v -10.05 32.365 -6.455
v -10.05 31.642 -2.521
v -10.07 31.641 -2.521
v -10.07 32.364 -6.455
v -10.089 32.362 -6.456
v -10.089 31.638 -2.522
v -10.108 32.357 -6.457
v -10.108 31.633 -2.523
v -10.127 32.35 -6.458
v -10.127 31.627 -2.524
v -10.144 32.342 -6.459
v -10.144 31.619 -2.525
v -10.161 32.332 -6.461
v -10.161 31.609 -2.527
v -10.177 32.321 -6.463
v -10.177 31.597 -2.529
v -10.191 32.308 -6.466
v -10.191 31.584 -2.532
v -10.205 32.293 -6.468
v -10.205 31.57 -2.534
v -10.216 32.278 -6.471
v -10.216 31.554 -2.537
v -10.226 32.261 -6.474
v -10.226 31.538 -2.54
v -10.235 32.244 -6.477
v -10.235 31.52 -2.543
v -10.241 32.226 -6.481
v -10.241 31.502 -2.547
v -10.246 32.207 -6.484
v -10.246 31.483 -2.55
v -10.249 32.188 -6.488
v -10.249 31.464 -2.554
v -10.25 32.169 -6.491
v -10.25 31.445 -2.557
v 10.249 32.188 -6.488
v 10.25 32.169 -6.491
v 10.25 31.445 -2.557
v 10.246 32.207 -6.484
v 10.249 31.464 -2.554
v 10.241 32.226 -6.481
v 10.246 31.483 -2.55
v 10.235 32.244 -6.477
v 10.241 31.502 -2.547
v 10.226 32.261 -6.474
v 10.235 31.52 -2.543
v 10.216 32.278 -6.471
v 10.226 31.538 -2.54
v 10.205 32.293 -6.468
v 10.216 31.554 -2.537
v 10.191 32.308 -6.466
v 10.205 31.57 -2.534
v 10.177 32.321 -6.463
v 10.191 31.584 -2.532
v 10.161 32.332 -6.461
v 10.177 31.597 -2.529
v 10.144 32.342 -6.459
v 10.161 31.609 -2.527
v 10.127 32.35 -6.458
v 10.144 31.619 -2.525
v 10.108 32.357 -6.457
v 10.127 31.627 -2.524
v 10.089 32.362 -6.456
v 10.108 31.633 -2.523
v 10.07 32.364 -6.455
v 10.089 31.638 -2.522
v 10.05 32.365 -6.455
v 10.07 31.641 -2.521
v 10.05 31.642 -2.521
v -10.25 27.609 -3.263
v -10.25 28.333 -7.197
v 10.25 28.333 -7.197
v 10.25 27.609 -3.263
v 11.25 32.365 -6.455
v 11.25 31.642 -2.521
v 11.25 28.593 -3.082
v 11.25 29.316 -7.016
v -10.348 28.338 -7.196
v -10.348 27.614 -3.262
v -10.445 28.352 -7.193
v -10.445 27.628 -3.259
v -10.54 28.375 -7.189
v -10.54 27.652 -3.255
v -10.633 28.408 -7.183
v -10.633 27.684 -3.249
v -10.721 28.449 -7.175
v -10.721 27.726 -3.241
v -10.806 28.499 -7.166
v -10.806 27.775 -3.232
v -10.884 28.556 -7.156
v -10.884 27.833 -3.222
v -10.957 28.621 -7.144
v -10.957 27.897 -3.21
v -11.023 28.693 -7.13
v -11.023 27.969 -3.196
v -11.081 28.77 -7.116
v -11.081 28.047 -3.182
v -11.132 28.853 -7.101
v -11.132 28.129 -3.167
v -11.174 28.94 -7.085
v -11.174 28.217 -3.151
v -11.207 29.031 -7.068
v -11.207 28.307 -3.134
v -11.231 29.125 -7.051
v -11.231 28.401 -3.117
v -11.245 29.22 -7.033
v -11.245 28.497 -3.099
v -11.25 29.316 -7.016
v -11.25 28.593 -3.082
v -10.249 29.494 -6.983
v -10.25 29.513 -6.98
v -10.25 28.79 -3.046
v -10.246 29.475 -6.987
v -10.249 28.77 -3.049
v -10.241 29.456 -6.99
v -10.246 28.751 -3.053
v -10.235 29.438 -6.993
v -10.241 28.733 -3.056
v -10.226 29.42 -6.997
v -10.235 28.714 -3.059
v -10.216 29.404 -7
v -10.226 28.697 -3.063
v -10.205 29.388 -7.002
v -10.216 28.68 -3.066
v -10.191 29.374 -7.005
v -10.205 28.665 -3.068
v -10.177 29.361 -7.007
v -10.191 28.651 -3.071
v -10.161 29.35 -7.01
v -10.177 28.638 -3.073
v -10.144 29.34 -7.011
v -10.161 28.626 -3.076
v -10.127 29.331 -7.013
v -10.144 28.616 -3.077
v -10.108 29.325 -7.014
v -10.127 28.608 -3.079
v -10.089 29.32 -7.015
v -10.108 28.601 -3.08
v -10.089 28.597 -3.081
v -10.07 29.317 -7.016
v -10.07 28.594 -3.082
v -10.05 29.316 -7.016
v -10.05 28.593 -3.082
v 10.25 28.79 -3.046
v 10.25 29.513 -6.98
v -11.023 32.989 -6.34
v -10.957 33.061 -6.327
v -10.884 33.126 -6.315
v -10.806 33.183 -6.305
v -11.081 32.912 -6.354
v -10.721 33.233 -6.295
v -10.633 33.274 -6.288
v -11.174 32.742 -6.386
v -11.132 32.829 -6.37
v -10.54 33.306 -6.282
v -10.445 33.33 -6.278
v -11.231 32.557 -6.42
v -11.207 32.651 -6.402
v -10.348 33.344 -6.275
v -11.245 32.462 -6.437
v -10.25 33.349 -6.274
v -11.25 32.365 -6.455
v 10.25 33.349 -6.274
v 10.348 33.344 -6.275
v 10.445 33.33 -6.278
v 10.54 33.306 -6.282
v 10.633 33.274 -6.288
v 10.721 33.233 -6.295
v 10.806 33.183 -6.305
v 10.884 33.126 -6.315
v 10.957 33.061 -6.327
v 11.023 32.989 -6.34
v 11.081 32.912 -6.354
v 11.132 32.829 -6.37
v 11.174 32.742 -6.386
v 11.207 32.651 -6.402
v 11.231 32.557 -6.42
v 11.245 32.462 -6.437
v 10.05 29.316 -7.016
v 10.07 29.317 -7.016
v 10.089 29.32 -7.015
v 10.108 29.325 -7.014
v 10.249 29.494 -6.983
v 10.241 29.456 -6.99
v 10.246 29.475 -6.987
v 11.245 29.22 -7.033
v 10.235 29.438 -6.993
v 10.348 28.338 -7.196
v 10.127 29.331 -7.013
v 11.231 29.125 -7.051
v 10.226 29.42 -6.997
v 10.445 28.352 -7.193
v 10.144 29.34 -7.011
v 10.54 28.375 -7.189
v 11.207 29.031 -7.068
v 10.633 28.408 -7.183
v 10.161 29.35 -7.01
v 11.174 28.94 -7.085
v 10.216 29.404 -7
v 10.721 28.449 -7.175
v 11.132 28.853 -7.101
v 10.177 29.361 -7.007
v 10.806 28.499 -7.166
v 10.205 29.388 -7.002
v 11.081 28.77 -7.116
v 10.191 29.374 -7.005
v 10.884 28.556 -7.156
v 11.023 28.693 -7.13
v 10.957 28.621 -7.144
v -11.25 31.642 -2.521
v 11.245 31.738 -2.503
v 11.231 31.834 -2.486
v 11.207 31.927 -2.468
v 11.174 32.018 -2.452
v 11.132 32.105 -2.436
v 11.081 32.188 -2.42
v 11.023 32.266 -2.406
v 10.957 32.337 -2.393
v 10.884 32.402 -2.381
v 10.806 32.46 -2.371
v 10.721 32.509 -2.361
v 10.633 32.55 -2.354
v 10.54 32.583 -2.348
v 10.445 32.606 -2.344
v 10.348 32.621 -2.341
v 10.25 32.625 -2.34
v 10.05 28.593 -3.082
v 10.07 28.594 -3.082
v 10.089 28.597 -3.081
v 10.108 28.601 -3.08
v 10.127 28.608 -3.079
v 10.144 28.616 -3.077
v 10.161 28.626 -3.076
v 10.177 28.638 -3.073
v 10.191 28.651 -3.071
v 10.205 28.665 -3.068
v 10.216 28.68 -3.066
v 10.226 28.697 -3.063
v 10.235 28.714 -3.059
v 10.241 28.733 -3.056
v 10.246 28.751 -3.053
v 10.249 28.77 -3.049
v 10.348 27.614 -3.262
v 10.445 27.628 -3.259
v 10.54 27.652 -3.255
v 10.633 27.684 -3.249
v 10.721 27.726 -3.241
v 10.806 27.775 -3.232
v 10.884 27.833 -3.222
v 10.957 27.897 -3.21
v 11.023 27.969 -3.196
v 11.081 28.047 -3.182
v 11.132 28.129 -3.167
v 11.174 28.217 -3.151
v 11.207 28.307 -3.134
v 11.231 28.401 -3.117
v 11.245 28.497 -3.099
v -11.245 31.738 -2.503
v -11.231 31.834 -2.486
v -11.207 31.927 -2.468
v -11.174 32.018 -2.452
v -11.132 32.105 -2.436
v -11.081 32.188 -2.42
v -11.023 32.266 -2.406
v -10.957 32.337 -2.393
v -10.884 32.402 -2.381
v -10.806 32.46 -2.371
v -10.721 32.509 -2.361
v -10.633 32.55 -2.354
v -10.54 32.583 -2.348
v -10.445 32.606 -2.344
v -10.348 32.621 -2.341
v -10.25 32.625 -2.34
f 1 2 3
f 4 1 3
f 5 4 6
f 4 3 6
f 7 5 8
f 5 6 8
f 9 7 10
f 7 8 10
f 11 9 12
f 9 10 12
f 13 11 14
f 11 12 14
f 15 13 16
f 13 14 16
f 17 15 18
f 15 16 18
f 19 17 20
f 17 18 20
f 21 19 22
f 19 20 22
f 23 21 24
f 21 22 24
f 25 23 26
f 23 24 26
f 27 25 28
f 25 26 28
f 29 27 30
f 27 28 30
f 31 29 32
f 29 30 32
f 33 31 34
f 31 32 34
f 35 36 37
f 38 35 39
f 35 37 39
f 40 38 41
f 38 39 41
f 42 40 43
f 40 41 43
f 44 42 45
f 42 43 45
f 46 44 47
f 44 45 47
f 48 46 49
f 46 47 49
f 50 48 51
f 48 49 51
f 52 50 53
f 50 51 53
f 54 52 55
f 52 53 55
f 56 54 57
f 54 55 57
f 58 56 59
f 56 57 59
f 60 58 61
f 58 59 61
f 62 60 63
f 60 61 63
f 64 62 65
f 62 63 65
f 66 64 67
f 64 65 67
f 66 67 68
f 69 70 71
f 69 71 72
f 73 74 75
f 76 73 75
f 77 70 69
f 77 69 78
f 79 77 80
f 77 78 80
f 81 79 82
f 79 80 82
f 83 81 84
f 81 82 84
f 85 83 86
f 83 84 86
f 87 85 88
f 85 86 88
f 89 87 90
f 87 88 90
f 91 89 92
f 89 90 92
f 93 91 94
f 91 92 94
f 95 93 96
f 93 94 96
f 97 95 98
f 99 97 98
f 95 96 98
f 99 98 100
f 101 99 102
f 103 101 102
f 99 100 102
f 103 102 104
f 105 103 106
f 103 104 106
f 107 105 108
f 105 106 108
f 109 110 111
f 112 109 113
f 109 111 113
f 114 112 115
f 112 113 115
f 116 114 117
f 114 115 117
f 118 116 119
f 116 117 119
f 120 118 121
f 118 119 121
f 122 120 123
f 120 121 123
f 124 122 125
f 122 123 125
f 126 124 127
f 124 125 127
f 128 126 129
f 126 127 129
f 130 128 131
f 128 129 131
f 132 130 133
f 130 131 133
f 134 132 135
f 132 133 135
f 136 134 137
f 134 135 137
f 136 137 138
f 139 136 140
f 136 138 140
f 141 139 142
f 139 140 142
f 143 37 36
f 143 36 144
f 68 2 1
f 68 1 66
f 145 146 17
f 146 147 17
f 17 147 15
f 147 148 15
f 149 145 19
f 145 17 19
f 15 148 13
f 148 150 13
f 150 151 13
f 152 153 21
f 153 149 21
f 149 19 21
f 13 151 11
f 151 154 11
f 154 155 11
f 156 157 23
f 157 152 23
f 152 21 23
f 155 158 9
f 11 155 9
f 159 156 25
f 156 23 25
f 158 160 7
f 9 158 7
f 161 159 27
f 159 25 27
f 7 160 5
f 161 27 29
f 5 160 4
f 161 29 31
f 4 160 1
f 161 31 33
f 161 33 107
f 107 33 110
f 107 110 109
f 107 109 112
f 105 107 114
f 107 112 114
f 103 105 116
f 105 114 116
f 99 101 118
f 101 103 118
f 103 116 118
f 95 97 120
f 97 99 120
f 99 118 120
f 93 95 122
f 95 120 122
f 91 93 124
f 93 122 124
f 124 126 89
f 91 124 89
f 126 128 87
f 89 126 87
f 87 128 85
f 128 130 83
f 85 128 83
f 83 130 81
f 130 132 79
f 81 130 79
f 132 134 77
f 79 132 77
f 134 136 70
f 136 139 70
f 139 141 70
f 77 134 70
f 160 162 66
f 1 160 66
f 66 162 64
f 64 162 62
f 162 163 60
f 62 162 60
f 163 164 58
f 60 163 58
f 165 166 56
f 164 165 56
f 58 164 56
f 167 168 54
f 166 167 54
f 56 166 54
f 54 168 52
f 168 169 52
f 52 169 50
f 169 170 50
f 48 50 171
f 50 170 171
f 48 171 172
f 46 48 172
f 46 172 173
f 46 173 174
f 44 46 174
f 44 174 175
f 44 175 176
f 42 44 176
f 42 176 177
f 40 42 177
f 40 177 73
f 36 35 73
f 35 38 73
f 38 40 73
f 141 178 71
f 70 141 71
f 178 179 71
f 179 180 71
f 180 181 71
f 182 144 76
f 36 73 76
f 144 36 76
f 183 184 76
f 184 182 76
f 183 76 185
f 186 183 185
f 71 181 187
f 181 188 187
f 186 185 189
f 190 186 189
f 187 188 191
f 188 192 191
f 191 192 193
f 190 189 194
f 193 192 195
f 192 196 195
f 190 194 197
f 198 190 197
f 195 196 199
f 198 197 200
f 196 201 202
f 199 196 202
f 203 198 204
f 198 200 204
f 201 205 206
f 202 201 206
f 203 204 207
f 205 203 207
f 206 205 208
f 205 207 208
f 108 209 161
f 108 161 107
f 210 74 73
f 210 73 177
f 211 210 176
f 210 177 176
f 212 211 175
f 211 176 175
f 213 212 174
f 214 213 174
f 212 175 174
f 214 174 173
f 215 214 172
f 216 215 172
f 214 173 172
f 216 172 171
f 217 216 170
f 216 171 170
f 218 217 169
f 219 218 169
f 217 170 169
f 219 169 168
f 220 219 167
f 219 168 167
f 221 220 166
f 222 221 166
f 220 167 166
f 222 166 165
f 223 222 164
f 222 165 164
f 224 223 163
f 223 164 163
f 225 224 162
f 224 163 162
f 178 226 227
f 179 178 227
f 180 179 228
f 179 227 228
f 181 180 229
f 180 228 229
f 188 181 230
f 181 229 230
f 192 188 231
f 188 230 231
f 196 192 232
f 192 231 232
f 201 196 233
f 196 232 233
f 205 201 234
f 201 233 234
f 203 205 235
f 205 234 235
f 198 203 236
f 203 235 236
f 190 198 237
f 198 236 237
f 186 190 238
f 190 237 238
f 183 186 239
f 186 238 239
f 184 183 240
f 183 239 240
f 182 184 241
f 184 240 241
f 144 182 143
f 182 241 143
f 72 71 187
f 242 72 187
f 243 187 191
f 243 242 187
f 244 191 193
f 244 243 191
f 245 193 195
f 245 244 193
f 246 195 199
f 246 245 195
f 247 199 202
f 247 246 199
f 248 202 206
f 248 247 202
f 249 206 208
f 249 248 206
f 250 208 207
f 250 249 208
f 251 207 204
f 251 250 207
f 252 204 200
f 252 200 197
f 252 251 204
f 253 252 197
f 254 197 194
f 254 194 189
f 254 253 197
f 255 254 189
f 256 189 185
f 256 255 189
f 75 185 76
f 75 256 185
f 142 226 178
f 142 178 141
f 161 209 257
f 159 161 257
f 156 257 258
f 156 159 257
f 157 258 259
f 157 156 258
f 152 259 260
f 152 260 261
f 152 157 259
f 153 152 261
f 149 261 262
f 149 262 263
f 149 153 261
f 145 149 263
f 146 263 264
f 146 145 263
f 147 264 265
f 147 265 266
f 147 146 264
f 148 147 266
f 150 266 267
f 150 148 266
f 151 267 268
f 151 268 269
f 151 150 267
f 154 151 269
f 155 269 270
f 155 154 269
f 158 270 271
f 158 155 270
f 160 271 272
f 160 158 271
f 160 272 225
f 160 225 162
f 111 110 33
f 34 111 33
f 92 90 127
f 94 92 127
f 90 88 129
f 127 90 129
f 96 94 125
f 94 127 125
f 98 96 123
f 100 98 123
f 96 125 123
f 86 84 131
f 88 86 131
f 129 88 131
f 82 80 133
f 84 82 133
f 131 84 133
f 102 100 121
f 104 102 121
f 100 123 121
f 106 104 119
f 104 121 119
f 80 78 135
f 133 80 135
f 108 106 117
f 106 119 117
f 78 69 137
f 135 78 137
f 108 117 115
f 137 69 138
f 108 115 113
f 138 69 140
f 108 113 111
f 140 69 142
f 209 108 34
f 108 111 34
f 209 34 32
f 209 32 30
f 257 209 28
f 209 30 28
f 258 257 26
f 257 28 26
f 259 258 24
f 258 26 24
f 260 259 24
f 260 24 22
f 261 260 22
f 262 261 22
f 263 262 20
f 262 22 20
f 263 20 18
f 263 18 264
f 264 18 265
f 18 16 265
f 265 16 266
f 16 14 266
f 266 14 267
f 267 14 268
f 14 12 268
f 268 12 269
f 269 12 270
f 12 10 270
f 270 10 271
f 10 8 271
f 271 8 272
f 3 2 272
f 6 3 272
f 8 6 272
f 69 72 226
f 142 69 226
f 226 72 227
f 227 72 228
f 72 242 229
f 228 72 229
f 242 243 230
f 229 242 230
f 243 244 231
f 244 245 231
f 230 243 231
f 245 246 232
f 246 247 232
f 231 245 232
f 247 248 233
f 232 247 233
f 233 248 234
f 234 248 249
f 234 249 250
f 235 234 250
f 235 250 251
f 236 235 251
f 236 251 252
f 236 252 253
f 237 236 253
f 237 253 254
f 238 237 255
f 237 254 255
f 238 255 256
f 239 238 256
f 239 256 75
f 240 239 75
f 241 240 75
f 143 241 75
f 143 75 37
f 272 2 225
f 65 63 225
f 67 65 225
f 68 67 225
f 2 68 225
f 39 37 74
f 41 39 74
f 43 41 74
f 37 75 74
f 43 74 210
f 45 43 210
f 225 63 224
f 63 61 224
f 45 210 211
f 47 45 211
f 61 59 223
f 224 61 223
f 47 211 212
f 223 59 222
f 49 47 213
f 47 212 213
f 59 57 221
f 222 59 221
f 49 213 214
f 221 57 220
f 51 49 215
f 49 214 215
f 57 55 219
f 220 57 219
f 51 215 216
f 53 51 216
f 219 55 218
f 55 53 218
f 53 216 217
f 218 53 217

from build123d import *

# Parameters (mm, degrees)
PAD003_DEPTH = 11.25
POCKET_DEPTH = 5
FILLET001_R  = 1


with BuildPart() as part:
    # Sketch → Pad003 (new body, symmetric)
    with BuildSketch(Plane.YZ):
        Polygon((27.6094120011, -3.2625768801), (32.625282988, -2.3400595397), (33.348826, -6.274076), (28.3329550131, -7.1965933403), align=None)
    extrude(amount=PAD003_DEPTH, both=True)

    # Sketch032 (on Face1 of Pad003) → Pocket (cut)
    with BuildSketch(Plane(origin=(0, 1.4837890217, -8.0675928562), x_dir=(0, -0.9835041151, -0.180885753), z_dir=(0, -0.180885753, 0.9835041151))):
        with BuildLine():
            Line((-30.463816642, 10.25), (-27.763816642, 10.25))
            ThreePointArc((-27.563816642, 10.05), (-27.6223952858, 10.1914213562), (-27.763816642, 10.25))
            Line((-27.563816642, 10.05), (-27.563816642, -10.05))
            ThreePointArc((-27.763816642, -10.25), (-27.6223952858, -10.1914213562), (-27.563816642, -10.05))
            Line((-27.763816642, -10.25), (-30.463816642, -10.25))
            ThreePointArc((-30.663816642, -10.05), (-30.6052379983, -10.1914213562), (-30.463816642, -10.25))
            Line((-30.663816642, -10.05), (-30.663816642, 10.05))
            ThreePointArc((-30.463816642, 10.25), (-30.6052379983, 10.1914213562), (-30.663816642, 10.05))
        make_face()
    extrude(amount=-POCKET_DEPTH, mode=Mode.SUBTRACT)

    # Fillet001
    fillet001_edges = [part.edges().sort_by_distance(p)[0] for p in [
        (11.25, 32.987054, -4.307068),
        (11.25, 27.971184, -5.229585),
        (-11.25, 32.987054, -4.307068),
        (-11.25, 27.971184, -5.229585),
    ]]
    fillet(fillet001_edges, radius=FILLET001_R)


solid = part.part
